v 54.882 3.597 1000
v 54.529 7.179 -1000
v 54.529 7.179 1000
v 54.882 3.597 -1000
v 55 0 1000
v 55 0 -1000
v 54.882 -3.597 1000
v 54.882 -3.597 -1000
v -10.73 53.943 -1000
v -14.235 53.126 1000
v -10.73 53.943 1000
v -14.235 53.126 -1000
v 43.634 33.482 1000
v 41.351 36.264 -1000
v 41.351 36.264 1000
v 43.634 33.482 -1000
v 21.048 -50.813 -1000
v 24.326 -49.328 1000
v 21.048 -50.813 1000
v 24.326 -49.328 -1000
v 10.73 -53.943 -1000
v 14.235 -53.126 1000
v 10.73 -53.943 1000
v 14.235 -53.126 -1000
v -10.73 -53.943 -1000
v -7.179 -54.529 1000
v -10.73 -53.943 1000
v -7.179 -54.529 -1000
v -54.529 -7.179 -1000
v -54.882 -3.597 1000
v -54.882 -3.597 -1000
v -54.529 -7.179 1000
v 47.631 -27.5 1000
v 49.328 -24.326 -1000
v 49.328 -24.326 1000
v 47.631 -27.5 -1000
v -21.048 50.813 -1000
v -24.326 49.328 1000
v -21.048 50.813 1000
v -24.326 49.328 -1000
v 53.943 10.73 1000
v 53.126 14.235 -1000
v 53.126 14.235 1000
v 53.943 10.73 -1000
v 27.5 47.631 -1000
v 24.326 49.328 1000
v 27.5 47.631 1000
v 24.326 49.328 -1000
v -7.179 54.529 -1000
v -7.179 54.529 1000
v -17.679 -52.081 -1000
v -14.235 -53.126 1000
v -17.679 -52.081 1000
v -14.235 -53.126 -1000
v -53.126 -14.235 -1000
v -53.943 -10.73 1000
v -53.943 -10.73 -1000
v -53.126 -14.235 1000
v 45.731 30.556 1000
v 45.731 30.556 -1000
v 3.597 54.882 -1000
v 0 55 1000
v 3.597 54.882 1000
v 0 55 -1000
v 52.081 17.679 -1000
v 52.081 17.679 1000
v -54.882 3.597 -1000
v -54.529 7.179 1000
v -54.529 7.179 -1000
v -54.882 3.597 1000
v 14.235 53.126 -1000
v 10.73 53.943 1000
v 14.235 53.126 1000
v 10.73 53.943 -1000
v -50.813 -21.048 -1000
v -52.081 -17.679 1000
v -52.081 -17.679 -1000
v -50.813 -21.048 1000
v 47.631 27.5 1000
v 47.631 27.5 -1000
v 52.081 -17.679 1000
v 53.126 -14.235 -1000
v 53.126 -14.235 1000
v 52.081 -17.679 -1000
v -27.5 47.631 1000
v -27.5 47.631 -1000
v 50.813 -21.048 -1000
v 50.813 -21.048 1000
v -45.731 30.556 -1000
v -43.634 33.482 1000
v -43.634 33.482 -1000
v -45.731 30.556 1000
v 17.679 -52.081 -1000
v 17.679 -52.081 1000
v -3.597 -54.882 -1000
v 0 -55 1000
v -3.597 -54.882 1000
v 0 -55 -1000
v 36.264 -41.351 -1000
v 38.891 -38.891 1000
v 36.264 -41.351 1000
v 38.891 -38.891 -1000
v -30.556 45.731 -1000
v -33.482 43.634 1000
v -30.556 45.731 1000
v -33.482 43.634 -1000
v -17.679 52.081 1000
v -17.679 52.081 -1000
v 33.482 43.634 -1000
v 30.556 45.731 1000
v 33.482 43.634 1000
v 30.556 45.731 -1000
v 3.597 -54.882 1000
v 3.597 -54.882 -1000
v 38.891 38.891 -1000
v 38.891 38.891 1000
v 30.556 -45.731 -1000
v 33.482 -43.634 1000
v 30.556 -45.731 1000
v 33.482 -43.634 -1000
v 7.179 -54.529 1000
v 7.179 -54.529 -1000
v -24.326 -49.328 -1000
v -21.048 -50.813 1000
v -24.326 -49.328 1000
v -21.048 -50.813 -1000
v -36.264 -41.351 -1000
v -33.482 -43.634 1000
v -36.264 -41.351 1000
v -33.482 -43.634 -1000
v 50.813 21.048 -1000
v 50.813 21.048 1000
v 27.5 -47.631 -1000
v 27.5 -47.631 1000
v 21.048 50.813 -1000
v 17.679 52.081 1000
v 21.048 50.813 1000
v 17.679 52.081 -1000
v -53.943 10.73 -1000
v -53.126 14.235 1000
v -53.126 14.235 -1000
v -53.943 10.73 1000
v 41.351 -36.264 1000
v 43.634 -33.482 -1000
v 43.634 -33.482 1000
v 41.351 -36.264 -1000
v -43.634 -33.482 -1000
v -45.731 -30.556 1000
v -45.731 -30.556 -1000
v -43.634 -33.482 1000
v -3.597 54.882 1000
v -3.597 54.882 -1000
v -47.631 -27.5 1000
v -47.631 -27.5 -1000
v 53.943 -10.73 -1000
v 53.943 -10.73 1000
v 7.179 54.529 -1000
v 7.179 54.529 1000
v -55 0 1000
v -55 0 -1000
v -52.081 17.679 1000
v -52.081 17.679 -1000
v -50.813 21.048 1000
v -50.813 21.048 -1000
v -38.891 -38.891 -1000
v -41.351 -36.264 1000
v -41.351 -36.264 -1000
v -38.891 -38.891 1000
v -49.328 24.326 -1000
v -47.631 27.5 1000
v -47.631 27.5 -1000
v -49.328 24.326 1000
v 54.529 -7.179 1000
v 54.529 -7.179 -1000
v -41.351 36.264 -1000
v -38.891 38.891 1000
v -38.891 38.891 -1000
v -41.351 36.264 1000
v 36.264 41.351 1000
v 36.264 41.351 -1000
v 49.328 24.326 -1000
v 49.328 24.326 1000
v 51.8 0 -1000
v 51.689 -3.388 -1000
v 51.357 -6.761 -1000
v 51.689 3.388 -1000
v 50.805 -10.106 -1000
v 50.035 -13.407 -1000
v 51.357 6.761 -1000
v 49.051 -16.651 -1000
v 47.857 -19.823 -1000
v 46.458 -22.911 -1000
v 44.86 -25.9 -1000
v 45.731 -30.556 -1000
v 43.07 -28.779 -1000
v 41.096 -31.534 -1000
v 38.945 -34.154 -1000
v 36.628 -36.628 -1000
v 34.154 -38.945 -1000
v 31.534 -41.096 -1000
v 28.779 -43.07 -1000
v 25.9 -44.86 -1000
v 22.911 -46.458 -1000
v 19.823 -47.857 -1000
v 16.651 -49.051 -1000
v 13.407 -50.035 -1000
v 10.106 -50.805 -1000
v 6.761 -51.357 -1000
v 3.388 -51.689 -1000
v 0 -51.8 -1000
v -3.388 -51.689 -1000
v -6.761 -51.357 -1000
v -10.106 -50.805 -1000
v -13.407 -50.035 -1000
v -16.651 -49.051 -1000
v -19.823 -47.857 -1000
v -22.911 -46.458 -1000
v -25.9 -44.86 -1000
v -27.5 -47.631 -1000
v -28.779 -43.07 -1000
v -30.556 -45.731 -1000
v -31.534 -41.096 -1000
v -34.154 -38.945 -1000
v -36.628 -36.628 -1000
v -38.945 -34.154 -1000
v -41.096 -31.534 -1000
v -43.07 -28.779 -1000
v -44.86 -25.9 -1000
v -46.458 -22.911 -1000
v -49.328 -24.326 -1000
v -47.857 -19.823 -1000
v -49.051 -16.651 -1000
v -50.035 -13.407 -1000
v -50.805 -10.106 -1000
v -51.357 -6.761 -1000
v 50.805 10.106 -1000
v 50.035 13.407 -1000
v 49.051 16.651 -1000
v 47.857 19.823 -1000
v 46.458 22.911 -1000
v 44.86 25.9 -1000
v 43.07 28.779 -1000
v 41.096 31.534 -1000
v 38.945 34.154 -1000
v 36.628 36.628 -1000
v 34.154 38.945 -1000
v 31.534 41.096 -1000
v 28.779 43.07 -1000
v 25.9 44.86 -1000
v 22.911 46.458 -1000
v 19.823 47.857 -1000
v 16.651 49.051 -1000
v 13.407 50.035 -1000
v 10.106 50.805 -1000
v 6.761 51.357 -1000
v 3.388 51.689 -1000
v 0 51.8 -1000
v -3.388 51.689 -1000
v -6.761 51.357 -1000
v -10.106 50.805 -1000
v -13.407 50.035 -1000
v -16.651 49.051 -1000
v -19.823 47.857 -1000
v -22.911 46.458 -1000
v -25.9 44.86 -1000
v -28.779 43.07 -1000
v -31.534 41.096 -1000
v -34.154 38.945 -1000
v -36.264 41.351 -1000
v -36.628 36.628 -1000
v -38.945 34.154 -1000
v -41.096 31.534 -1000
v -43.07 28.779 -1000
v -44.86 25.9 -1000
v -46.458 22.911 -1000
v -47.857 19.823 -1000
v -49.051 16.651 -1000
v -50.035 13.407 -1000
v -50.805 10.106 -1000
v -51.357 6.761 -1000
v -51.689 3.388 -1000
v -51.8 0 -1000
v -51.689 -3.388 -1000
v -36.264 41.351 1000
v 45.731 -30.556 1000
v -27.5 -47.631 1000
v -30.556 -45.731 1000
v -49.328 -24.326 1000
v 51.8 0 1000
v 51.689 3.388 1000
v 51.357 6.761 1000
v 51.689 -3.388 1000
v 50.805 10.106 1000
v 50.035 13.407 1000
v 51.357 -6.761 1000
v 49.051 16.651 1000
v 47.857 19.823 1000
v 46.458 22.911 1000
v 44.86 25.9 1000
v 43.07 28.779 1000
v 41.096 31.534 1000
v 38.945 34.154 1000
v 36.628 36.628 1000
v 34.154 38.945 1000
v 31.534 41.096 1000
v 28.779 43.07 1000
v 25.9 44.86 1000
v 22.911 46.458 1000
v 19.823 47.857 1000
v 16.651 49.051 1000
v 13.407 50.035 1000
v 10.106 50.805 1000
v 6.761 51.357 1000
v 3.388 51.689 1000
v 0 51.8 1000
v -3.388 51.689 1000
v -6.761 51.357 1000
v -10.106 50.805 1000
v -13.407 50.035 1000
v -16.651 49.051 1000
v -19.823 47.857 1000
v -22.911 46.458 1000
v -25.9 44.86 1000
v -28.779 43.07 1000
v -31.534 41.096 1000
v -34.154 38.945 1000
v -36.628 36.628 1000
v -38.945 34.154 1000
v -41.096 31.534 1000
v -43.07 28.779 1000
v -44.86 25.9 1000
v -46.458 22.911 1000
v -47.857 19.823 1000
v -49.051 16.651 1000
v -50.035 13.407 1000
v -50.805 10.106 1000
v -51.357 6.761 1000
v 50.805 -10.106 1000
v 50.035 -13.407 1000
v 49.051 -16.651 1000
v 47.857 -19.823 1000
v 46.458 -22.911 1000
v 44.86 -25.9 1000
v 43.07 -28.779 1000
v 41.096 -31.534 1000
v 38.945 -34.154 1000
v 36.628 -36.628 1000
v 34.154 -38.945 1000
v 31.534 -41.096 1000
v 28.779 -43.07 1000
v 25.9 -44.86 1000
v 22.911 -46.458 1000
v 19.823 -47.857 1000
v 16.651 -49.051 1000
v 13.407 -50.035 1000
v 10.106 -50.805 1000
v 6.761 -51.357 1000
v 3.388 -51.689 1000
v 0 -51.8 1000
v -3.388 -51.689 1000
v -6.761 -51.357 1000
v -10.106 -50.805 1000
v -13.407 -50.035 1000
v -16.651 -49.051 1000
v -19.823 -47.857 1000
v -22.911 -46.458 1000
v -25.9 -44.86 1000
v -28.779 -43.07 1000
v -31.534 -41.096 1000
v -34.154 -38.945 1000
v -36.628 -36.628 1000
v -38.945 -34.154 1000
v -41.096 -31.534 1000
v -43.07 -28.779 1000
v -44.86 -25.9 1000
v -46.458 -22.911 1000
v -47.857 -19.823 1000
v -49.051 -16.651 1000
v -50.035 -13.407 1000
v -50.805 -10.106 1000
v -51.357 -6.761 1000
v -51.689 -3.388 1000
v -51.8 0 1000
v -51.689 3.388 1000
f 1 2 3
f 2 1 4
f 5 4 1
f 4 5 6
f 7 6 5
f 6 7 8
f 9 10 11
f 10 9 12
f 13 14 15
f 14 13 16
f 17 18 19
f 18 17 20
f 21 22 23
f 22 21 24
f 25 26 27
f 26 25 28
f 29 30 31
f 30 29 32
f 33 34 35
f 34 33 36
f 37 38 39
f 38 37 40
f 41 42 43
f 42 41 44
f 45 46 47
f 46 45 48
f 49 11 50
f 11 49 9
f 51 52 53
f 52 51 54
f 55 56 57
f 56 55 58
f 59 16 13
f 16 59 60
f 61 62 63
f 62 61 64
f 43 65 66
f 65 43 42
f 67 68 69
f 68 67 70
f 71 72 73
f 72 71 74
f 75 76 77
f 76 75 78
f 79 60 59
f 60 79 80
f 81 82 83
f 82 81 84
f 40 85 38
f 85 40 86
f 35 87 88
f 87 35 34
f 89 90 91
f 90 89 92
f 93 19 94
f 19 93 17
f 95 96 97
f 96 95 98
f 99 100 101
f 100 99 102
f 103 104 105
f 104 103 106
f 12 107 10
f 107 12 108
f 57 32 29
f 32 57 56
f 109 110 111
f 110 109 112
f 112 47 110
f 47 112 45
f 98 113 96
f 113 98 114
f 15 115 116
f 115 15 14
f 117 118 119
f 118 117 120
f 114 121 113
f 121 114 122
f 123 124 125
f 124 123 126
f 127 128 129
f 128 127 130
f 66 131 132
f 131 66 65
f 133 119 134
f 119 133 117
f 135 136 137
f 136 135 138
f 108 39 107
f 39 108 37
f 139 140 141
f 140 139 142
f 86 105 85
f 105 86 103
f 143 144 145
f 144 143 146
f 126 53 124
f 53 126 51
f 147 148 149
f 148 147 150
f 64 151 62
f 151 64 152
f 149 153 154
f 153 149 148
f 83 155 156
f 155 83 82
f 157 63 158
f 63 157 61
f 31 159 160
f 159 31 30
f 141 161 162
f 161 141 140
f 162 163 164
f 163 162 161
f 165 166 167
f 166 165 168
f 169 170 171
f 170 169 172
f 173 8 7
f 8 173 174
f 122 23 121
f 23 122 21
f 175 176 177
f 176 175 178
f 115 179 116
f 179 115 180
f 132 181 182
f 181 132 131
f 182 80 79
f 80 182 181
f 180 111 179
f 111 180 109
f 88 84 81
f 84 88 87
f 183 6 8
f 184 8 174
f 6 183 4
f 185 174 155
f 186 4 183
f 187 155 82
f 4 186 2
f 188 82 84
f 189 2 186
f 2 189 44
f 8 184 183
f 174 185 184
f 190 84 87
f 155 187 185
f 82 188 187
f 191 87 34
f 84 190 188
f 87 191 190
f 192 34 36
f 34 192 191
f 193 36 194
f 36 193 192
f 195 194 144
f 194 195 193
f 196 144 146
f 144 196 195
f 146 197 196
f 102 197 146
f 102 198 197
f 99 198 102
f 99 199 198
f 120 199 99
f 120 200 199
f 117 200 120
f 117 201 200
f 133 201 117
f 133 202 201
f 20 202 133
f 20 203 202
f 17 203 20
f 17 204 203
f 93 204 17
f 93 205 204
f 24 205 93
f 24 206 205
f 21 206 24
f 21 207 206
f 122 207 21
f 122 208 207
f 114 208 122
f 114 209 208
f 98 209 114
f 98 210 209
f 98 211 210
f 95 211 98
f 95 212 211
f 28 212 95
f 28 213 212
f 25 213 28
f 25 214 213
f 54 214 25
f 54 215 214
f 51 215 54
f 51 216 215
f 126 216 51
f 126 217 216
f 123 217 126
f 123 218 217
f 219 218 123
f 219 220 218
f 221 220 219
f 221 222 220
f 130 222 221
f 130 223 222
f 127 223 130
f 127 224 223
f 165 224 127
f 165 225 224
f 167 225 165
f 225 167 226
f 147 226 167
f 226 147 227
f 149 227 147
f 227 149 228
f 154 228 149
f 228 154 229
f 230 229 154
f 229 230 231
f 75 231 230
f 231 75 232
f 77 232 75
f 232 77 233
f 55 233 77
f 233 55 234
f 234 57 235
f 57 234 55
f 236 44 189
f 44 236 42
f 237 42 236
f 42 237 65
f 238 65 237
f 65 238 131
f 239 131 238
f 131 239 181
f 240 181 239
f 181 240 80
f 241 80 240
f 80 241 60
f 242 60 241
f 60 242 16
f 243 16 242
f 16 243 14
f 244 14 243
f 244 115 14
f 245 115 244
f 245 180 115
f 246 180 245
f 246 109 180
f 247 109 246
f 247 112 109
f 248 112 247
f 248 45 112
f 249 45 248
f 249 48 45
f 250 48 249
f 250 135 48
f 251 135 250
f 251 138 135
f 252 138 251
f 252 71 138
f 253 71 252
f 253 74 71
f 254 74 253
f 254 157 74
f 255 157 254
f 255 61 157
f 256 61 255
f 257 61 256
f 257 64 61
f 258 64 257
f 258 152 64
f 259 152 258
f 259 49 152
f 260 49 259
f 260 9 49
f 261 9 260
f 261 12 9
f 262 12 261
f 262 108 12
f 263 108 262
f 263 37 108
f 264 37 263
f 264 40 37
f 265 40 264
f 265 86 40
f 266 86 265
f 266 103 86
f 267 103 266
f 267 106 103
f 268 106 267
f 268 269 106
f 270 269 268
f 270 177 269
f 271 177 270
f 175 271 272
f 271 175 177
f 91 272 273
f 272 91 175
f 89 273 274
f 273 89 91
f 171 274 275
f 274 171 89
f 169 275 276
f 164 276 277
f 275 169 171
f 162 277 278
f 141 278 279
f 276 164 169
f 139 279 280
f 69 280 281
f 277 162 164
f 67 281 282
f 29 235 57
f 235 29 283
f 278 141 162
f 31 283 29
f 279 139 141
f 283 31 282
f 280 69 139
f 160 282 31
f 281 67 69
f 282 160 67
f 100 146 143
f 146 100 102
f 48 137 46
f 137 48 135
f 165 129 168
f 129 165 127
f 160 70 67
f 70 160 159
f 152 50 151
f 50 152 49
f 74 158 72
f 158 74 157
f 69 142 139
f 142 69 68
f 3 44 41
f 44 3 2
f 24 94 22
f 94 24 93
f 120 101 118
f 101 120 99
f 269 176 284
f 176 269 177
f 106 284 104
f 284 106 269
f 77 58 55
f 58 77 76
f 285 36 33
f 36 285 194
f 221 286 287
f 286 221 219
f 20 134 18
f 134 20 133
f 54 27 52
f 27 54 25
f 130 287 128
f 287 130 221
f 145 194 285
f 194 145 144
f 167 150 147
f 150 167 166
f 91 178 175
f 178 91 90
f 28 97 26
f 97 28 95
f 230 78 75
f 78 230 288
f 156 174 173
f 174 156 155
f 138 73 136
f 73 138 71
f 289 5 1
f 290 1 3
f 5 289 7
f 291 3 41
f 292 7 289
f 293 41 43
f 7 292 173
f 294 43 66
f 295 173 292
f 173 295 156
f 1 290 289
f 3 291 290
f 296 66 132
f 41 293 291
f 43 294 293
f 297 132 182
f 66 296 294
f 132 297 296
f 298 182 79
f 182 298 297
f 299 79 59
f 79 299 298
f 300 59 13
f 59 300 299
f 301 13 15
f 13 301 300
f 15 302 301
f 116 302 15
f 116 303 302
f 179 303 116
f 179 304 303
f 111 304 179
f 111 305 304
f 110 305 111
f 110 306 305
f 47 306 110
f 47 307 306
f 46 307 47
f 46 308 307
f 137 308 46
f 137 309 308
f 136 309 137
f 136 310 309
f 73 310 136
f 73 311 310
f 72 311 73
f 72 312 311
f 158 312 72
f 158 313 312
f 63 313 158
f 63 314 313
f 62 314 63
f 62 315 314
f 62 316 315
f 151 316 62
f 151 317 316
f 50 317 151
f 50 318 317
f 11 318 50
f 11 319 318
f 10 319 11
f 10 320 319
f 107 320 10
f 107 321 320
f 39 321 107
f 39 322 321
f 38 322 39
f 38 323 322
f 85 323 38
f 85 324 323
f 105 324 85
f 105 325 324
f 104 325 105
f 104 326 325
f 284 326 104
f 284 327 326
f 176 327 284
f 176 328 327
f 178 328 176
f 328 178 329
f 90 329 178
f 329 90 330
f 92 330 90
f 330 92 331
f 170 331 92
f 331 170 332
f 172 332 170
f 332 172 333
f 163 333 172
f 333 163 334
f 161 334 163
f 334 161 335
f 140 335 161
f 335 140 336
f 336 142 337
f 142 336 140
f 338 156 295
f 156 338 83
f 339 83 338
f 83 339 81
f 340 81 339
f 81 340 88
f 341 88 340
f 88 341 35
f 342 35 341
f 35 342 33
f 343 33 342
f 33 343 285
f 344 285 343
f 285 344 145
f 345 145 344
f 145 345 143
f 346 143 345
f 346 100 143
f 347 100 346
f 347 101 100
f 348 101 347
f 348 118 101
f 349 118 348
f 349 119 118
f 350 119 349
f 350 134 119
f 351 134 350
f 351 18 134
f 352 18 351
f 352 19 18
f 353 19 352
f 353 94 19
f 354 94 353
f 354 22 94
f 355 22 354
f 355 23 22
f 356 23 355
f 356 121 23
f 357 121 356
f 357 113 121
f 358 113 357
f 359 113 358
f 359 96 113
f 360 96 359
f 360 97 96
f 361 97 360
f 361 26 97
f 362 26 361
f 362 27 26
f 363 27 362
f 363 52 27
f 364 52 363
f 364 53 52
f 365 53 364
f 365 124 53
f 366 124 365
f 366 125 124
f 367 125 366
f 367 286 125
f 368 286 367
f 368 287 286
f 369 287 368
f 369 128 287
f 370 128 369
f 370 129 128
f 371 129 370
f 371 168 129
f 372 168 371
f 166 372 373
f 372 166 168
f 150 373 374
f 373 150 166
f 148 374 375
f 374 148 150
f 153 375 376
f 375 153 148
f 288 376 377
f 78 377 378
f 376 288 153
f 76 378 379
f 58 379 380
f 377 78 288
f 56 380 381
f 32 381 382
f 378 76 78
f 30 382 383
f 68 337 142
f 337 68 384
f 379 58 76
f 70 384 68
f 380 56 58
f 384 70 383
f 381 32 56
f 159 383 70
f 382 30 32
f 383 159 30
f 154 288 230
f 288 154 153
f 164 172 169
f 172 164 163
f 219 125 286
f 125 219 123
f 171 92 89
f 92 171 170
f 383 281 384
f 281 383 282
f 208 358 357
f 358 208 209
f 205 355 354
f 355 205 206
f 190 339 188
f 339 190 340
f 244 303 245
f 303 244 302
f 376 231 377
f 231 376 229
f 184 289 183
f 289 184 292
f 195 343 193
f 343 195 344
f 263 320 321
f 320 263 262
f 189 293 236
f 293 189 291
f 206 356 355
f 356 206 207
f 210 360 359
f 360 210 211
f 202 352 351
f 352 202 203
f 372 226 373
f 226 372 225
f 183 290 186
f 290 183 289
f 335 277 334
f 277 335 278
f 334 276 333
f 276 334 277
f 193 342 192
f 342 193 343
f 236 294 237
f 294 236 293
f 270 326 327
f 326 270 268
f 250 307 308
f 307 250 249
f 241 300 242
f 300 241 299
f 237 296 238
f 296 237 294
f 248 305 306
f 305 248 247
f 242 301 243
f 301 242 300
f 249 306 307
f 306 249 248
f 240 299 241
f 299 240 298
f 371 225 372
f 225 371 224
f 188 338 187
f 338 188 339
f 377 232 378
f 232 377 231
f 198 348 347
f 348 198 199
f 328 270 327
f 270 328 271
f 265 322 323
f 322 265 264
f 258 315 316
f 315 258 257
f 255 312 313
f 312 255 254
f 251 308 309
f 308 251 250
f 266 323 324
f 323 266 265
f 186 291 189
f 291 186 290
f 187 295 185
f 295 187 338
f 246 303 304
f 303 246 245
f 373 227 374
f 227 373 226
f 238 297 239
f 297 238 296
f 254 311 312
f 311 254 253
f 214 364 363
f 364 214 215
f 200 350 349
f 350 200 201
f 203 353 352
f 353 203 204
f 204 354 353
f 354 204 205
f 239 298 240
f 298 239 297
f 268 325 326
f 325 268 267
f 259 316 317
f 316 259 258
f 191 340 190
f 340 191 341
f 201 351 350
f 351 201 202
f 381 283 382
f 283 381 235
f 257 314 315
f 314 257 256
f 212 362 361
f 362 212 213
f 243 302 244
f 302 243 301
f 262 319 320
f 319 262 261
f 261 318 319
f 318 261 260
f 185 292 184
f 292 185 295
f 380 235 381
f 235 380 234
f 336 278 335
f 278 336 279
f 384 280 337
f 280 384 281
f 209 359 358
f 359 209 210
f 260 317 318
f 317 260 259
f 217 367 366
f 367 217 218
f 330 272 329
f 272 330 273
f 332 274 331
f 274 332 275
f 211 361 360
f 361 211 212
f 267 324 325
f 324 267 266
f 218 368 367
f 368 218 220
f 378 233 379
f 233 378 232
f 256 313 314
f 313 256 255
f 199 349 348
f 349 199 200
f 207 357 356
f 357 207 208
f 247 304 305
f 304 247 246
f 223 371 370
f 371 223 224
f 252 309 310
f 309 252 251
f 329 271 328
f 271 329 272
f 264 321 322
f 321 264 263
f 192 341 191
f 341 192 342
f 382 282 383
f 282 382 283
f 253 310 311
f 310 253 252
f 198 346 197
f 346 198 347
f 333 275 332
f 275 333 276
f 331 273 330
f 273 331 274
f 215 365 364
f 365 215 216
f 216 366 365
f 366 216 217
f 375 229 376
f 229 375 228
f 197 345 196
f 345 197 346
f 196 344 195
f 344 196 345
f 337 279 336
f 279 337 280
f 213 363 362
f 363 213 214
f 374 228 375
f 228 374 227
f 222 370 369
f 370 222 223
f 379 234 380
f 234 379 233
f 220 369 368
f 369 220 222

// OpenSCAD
$fn=96;

module ht_pipe(length=2000, od=110, wall=3.2) {
    difference() {
        cylinder(h=length, d=od, center=true);
        cylinder(h=length+2, d=od-2*wall, center=true);
    }
}

ht_pipe(length=2000, od=110, wall=3.2);
